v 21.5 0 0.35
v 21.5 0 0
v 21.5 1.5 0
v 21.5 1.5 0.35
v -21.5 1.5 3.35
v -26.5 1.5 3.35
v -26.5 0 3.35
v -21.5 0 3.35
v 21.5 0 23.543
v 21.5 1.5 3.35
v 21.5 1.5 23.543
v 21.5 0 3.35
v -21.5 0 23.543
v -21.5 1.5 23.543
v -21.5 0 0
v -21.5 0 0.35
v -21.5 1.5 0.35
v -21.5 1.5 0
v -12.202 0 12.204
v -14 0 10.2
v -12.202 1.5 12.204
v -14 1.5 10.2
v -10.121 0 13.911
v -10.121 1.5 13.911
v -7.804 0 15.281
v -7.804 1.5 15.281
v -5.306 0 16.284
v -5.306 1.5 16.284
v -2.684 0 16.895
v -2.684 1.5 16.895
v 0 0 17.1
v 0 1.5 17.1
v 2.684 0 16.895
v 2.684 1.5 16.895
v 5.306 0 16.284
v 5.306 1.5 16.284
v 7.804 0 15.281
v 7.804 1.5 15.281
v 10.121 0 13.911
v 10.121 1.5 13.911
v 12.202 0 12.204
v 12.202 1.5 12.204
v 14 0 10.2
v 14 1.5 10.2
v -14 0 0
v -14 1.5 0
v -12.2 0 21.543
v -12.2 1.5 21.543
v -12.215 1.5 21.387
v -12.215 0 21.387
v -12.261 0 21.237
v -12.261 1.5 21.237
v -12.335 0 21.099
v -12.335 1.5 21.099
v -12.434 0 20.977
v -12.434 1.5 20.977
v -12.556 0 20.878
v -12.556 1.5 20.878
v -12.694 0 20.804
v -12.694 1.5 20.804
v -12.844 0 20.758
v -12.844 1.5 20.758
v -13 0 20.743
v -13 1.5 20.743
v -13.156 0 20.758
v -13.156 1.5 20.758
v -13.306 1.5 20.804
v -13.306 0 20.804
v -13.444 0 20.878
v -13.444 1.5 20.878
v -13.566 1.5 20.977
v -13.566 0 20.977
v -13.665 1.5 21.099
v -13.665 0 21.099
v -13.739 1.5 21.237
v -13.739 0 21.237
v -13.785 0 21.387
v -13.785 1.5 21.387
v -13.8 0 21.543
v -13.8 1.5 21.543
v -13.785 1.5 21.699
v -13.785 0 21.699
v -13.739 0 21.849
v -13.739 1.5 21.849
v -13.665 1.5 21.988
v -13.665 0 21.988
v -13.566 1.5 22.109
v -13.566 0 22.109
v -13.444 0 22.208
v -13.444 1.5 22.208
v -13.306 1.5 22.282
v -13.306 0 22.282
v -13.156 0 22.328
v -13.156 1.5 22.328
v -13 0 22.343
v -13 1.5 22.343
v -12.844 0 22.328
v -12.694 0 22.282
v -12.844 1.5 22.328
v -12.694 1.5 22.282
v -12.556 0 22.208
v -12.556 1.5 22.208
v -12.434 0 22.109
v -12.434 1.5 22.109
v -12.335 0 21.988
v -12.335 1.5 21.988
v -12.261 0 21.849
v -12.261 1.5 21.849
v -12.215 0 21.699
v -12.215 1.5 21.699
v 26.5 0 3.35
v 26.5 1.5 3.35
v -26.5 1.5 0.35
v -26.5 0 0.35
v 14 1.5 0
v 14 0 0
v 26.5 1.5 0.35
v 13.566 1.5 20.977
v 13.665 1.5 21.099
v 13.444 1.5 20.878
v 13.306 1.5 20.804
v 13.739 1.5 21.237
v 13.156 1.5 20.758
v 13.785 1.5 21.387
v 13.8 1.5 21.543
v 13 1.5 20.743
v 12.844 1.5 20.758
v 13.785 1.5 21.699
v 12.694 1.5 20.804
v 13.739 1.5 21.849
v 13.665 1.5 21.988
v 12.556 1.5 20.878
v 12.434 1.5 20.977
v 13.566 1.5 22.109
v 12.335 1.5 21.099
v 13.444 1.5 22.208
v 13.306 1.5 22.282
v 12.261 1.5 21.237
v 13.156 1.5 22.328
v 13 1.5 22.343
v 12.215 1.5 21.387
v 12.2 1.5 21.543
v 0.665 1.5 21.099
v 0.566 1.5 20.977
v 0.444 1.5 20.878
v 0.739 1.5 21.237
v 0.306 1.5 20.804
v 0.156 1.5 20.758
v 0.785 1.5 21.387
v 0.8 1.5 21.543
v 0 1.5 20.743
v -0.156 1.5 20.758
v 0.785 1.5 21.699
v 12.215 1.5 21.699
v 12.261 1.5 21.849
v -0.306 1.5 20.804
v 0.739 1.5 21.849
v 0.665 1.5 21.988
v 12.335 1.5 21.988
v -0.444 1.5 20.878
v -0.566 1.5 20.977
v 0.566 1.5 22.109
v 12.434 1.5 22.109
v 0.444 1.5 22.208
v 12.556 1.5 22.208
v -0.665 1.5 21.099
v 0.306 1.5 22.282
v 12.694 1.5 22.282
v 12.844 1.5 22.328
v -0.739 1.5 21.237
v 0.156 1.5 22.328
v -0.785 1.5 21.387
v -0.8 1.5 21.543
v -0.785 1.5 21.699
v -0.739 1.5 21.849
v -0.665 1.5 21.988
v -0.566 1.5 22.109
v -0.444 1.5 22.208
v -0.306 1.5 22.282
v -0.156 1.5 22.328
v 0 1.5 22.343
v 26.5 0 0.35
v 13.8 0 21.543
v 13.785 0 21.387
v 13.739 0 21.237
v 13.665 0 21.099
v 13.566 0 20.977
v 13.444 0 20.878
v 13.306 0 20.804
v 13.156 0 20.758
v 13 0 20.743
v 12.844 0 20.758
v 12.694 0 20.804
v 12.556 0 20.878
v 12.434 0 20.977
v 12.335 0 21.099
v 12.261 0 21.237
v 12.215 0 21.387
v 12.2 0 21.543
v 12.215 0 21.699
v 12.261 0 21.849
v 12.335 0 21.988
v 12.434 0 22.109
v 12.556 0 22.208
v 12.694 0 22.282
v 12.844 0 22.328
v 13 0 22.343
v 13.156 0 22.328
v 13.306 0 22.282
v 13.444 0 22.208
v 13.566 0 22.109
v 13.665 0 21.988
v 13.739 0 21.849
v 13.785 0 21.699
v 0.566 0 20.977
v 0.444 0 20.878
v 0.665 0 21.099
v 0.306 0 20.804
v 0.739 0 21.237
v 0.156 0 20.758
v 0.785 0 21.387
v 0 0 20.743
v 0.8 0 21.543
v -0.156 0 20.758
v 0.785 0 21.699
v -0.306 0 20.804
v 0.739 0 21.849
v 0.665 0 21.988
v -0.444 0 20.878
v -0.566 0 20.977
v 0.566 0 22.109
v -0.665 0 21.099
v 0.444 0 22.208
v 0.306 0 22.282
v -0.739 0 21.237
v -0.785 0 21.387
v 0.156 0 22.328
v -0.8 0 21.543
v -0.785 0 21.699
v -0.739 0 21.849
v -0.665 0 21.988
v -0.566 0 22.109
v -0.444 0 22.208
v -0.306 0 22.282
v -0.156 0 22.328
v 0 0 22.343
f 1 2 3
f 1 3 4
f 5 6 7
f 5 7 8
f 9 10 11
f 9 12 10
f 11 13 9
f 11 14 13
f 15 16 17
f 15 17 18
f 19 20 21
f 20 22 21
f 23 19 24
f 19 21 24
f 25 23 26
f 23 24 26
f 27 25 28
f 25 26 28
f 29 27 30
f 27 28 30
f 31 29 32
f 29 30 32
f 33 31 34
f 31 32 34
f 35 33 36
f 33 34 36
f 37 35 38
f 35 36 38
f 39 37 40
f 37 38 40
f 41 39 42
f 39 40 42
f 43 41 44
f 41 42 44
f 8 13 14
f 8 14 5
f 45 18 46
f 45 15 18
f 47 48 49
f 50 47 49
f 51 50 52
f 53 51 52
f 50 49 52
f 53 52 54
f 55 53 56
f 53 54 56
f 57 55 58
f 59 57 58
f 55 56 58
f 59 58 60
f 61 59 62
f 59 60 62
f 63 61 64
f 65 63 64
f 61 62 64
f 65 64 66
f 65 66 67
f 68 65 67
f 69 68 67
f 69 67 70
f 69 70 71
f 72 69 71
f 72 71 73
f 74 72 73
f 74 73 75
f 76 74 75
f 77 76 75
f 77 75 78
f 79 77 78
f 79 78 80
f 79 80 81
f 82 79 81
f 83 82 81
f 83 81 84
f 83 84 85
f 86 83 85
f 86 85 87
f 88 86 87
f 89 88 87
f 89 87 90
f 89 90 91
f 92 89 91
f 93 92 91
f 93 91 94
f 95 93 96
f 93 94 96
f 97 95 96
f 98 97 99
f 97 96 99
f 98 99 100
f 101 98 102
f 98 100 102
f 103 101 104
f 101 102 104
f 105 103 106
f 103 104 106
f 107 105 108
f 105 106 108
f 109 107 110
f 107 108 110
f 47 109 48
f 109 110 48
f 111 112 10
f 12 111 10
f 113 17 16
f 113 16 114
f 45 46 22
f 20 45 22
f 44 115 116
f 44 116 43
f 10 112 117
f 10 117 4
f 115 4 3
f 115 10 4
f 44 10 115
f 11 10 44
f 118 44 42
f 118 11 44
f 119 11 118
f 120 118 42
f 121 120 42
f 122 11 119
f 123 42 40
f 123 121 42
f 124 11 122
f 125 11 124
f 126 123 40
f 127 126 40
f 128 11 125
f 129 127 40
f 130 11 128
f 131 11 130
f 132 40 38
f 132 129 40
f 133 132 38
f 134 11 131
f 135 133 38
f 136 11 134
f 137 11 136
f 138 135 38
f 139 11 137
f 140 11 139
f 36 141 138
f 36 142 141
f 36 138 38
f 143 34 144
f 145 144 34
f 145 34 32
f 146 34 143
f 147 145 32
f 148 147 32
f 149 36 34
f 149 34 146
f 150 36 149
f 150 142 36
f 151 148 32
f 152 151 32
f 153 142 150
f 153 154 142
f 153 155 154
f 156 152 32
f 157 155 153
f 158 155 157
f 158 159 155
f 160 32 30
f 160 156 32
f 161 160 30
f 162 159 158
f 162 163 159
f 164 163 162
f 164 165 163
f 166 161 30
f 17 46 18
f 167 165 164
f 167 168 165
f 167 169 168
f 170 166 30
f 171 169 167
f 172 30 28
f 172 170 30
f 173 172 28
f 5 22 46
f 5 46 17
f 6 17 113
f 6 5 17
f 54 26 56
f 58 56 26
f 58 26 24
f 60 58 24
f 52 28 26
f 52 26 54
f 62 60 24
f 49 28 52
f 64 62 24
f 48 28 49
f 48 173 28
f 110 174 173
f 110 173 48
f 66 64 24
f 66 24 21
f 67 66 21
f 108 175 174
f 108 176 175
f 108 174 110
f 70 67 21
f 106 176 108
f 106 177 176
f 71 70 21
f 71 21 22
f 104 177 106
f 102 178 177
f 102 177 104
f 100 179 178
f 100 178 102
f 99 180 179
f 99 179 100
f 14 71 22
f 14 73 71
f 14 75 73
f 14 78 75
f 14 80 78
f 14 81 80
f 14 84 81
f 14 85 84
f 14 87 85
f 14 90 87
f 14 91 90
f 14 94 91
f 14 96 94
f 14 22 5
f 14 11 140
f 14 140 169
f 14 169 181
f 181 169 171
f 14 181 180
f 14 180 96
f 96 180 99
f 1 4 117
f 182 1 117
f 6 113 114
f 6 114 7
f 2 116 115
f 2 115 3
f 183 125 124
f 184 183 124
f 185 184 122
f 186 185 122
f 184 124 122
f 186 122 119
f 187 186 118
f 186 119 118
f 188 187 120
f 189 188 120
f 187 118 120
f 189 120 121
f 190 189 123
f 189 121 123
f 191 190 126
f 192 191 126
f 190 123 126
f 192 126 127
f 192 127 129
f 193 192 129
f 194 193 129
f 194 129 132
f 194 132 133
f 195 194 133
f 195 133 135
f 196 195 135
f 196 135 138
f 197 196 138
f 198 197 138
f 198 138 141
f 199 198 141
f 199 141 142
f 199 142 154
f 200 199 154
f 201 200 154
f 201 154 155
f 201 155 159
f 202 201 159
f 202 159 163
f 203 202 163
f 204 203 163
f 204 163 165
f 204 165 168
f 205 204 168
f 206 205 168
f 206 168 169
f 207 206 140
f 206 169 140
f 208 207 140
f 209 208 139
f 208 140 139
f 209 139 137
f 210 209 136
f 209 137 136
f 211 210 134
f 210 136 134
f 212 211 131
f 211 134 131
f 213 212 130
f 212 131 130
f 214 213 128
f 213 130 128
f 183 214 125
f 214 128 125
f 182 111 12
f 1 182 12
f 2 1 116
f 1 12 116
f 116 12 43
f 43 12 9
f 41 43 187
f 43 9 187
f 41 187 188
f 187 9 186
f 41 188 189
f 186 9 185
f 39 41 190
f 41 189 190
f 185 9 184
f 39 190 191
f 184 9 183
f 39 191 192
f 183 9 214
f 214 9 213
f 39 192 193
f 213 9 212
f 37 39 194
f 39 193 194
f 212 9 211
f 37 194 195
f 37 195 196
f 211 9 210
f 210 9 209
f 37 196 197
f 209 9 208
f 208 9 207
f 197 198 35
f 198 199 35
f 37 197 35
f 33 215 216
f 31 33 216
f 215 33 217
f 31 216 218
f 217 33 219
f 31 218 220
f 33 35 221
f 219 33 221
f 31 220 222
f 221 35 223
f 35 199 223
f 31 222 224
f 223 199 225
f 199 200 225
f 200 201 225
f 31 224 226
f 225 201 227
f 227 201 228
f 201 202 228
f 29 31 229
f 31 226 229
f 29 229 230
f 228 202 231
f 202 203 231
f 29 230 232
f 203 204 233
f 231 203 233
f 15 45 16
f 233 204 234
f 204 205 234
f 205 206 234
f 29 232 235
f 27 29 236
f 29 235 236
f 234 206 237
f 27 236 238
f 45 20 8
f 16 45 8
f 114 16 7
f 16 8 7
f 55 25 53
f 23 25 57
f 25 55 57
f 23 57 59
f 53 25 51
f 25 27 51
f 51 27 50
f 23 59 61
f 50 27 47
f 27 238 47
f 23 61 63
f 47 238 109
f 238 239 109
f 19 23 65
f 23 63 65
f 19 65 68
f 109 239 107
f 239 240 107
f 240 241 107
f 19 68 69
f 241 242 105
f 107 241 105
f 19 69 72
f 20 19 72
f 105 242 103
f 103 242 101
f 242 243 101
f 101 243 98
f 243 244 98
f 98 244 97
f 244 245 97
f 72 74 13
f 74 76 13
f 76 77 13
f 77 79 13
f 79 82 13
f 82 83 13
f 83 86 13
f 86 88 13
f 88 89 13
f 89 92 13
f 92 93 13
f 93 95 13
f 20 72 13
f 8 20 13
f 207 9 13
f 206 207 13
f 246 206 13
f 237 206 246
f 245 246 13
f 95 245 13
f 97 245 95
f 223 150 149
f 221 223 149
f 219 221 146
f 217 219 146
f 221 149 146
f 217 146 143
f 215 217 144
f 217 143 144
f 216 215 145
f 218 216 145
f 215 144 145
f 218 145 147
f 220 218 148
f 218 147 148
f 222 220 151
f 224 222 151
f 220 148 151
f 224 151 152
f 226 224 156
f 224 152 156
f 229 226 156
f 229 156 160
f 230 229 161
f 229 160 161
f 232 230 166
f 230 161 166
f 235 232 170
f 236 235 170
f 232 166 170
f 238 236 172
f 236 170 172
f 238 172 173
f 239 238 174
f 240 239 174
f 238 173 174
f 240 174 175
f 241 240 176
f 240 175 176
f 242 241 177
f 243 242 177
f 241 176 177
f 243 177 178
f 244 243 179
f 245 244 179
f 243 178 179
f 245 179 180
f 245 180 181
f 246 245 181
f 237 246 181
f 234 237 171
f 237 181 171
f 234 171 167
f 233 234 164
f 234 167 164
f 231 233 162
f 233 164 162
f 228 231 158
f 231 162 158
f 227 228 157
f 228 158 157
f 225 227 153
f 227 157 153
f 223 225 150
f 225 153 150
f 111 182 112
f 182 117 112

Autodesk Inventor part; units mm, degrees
ref_plane "YZ Plane" through (0, 0, 0) normal (1, 0, 0) x (0, 1, 0)
ref_plane "XZ Plane" through (0, 0, 0) normal (0, 1, 0) x (-1, 0, 0)
ref_plane "XY Plane" through (0, 0, 0) normal (0, 0, 1) x (1, 0, 0)
sketch "スケッチ8" plane through (0, 1.5, 0) normal (0, 1, 0) x (1, 0, 0)
  line L0 (-21.5, -23.5431) -> (-21.5, 0)
  line L1 (-21.5, -0.35) -> (-26.5, -0.35)
  line L2 (-26.5, -0.35) -> (-26.5, -3.35)
  line L3 (-26.5, -3.35) -> (-21.5, -3.35)
  line L4 (-21.5, -3.35) -> (-21.5, -0.35)
  line L5 (21.5, 0) -> (21.5, -23.5431)
  line L6 (21.5, -0.35) -> (26.5, -0.35)
  line L7 (26.5, -0.35) -> (26.5, -3.35)
  line L8 (26.5, -3.35) -> (21.5, -3.35)
  line L9 (21.5, -3.35) -> (21.5, -0.35)
  line L10 (-21.5, 0) -> (-14, 0)
  point P0 (0, 0)
  point P1 (-26.5, -1.85)
  dimension "d28" = 5
  dimension "d29" = 3
  dimension "d30" = 1.85
sketch "スケッチ1" plane through (0, 0, 0) normal (0, 1, 0) x (-1, 0, 0)
  line L0 (21.5, 0) -> (-21.5, 0)
  line L1 (-21.5, 0) -> (-21.5, 25.1)
  line L2 (-21.5, 25.1) -> (21.5, 25.1)
  line L3 (21.5, 25.1) -> (21.5, 0)
  point P0 (0, 0)
  point P1 (0, 0)
  dimension "d0" = 25.1
  dimension "d1" = 43
extrude "プレート1" add sketch "スケッチ1" along normal blind 1.5
sketch "スケッチ3" plane through (0, 1.5, 0) normal (0, 1, 0) x (1, 0, 0)
  line L0 (21.5, 0) -> (-21.5, 0) projected
  line L1 (-20, 0) -> (-20, -17.1)
  line L2 (20, 0) -> (20, -17.1)
  line L3 (-21.5, -25.1) -> (-21.5, 0) projected
  line L4 (21.5, 0) -> (21.5, -25.1) projected
  line L5 (-20, -17.1) -> (20, -17.1)
  line L6 (-20, 0) -> (-14, 0)
  line L7 (-14, 0) -> (-14, -10.2)
  line L8 (-14, -10.2) -> (-20, -10.2)
  line L9 (-20, -10.2) -> (-20, 0)
  line L10 (20, 0) -> (14, 0)
  line L11 (14, 0) -> (14, -10.2)
  line L12 (14, -10.2) -> (20, -10.2)
  line L13 (20, -10.2) -> (20, 0)
  line L14 (-20, -10.2) -> (-21.5, -10.2)
  line L15 (20, -10.2) -> (21.5, -10.2)
  line L16 (21.5, -25.1) -> (-21.5, -25.1) projected
  arc A0 (-14, -10.2) -> (14, -10.2) centre (0, 0.5529) ccw
  point P0 (0, 0)
  point P1 (20, -10.2)
  point P2 (14, 0)
  point P3 (-14, 0)
  dimension "d5" = 1.5
  dimension "d6" = 1.5
  dimension "d7" = 6
  dimension "d8" = 10.2
  dimension "d9" = 8
extrude "押し出し2" cut sketch "スケッチ3" against normal through all contours L11 A0 L7 L0
sketch "スケッチ4" plane through (-21.5, 0, 25.1) normal (-1, 0, 0) x (0, 0, 1)
  line L0 (-0.5569, 2.6) -> (-0.5569, 0)
  line L1 (0, 0) -> (-25.1, 0) projected
  line L2 (-25.1, 0) -> (0, 0) projected
  line L3 (0, 0) -> (0, 1.5) projected
  line L4 (0, 1.5) -> (-25.1, 1.5) projected
  line L5 (-25.1, 0) -> (-25.1, 1.5) projected
  point P0 (-14.9, 0)
  point P1 (0, 0)
  point P2 (-0.5569, 1.5)
extrude "押し出し3" cut sketch "スケッチ4" against normal through all contours L4 L3 L1 L0
sketch "スケッチ5" plane through (0, 1.5, 0) normal (0, 1, 0) x (1, 0, 0)
  circle A0 centre (0, -21.5431) radius 0.8 projected
  circle A1 centre (-13, -21.5431) radius 0.8 projected
  circle A2 centre (13, -21.5431) radius 0.8 projected
  line L0 (-21.5, -24.5431) -> (-21.5, 0) projected
  line L1 (-21.5, -23.5431) -> (21.5, -23.5431)
  line L2 (21.5, -24.5431) -> (-21.5, -24.5431) projected
  line L3 (21.5, 0) -> (21.5, -24.5431) projected
  point P0 (0, 0)
  point P1 (-21.5, -10.2)
  point P2 (21.5, -10.2)
  dimension "d16" = 1
extrude "切り取り1" cut sketch "スケッチ5" against normal blind 1.5
sheet face with bend "面3" sketch "スケッチ8" thickness 1.5 toward (0, -1, 0) bend radius 1.5
bend "曲げ2"
equation "\"d6\" = d5"
equation "\"d14\" = Thickness"
equation "\"d2\" = Thickness"
equation "\"d31\" = BendRadius"
equation "\"d32\" = BendReliefWidth"
equation "\"d34\" = MinimumRemnant"
equation "\"d33\" = BendReliefDepth"
equation "\"d35\" = TransitionRadius"
equation "\"BendRadius\" = Thickness"
equation "\"BendReliefWidth\" = Thickness"
equation "\"BendReliefDepth\" = 0.5 * Thickness"
equation "\"CornerReliefSize\" = 4 * Thickness"
equation "\"MinimumRemnant\" = 2 * Thickness"
equation "\"TransitionRadius\" = BendRadius"
equation "\"JacobiRadiusSize\" = BendRadius"
equation "\"GapSize\" = Thickness"
equation "\"Thickness\" = 1.5"
properties part number "chest_cover_base" material "アルミニウム 6061"
